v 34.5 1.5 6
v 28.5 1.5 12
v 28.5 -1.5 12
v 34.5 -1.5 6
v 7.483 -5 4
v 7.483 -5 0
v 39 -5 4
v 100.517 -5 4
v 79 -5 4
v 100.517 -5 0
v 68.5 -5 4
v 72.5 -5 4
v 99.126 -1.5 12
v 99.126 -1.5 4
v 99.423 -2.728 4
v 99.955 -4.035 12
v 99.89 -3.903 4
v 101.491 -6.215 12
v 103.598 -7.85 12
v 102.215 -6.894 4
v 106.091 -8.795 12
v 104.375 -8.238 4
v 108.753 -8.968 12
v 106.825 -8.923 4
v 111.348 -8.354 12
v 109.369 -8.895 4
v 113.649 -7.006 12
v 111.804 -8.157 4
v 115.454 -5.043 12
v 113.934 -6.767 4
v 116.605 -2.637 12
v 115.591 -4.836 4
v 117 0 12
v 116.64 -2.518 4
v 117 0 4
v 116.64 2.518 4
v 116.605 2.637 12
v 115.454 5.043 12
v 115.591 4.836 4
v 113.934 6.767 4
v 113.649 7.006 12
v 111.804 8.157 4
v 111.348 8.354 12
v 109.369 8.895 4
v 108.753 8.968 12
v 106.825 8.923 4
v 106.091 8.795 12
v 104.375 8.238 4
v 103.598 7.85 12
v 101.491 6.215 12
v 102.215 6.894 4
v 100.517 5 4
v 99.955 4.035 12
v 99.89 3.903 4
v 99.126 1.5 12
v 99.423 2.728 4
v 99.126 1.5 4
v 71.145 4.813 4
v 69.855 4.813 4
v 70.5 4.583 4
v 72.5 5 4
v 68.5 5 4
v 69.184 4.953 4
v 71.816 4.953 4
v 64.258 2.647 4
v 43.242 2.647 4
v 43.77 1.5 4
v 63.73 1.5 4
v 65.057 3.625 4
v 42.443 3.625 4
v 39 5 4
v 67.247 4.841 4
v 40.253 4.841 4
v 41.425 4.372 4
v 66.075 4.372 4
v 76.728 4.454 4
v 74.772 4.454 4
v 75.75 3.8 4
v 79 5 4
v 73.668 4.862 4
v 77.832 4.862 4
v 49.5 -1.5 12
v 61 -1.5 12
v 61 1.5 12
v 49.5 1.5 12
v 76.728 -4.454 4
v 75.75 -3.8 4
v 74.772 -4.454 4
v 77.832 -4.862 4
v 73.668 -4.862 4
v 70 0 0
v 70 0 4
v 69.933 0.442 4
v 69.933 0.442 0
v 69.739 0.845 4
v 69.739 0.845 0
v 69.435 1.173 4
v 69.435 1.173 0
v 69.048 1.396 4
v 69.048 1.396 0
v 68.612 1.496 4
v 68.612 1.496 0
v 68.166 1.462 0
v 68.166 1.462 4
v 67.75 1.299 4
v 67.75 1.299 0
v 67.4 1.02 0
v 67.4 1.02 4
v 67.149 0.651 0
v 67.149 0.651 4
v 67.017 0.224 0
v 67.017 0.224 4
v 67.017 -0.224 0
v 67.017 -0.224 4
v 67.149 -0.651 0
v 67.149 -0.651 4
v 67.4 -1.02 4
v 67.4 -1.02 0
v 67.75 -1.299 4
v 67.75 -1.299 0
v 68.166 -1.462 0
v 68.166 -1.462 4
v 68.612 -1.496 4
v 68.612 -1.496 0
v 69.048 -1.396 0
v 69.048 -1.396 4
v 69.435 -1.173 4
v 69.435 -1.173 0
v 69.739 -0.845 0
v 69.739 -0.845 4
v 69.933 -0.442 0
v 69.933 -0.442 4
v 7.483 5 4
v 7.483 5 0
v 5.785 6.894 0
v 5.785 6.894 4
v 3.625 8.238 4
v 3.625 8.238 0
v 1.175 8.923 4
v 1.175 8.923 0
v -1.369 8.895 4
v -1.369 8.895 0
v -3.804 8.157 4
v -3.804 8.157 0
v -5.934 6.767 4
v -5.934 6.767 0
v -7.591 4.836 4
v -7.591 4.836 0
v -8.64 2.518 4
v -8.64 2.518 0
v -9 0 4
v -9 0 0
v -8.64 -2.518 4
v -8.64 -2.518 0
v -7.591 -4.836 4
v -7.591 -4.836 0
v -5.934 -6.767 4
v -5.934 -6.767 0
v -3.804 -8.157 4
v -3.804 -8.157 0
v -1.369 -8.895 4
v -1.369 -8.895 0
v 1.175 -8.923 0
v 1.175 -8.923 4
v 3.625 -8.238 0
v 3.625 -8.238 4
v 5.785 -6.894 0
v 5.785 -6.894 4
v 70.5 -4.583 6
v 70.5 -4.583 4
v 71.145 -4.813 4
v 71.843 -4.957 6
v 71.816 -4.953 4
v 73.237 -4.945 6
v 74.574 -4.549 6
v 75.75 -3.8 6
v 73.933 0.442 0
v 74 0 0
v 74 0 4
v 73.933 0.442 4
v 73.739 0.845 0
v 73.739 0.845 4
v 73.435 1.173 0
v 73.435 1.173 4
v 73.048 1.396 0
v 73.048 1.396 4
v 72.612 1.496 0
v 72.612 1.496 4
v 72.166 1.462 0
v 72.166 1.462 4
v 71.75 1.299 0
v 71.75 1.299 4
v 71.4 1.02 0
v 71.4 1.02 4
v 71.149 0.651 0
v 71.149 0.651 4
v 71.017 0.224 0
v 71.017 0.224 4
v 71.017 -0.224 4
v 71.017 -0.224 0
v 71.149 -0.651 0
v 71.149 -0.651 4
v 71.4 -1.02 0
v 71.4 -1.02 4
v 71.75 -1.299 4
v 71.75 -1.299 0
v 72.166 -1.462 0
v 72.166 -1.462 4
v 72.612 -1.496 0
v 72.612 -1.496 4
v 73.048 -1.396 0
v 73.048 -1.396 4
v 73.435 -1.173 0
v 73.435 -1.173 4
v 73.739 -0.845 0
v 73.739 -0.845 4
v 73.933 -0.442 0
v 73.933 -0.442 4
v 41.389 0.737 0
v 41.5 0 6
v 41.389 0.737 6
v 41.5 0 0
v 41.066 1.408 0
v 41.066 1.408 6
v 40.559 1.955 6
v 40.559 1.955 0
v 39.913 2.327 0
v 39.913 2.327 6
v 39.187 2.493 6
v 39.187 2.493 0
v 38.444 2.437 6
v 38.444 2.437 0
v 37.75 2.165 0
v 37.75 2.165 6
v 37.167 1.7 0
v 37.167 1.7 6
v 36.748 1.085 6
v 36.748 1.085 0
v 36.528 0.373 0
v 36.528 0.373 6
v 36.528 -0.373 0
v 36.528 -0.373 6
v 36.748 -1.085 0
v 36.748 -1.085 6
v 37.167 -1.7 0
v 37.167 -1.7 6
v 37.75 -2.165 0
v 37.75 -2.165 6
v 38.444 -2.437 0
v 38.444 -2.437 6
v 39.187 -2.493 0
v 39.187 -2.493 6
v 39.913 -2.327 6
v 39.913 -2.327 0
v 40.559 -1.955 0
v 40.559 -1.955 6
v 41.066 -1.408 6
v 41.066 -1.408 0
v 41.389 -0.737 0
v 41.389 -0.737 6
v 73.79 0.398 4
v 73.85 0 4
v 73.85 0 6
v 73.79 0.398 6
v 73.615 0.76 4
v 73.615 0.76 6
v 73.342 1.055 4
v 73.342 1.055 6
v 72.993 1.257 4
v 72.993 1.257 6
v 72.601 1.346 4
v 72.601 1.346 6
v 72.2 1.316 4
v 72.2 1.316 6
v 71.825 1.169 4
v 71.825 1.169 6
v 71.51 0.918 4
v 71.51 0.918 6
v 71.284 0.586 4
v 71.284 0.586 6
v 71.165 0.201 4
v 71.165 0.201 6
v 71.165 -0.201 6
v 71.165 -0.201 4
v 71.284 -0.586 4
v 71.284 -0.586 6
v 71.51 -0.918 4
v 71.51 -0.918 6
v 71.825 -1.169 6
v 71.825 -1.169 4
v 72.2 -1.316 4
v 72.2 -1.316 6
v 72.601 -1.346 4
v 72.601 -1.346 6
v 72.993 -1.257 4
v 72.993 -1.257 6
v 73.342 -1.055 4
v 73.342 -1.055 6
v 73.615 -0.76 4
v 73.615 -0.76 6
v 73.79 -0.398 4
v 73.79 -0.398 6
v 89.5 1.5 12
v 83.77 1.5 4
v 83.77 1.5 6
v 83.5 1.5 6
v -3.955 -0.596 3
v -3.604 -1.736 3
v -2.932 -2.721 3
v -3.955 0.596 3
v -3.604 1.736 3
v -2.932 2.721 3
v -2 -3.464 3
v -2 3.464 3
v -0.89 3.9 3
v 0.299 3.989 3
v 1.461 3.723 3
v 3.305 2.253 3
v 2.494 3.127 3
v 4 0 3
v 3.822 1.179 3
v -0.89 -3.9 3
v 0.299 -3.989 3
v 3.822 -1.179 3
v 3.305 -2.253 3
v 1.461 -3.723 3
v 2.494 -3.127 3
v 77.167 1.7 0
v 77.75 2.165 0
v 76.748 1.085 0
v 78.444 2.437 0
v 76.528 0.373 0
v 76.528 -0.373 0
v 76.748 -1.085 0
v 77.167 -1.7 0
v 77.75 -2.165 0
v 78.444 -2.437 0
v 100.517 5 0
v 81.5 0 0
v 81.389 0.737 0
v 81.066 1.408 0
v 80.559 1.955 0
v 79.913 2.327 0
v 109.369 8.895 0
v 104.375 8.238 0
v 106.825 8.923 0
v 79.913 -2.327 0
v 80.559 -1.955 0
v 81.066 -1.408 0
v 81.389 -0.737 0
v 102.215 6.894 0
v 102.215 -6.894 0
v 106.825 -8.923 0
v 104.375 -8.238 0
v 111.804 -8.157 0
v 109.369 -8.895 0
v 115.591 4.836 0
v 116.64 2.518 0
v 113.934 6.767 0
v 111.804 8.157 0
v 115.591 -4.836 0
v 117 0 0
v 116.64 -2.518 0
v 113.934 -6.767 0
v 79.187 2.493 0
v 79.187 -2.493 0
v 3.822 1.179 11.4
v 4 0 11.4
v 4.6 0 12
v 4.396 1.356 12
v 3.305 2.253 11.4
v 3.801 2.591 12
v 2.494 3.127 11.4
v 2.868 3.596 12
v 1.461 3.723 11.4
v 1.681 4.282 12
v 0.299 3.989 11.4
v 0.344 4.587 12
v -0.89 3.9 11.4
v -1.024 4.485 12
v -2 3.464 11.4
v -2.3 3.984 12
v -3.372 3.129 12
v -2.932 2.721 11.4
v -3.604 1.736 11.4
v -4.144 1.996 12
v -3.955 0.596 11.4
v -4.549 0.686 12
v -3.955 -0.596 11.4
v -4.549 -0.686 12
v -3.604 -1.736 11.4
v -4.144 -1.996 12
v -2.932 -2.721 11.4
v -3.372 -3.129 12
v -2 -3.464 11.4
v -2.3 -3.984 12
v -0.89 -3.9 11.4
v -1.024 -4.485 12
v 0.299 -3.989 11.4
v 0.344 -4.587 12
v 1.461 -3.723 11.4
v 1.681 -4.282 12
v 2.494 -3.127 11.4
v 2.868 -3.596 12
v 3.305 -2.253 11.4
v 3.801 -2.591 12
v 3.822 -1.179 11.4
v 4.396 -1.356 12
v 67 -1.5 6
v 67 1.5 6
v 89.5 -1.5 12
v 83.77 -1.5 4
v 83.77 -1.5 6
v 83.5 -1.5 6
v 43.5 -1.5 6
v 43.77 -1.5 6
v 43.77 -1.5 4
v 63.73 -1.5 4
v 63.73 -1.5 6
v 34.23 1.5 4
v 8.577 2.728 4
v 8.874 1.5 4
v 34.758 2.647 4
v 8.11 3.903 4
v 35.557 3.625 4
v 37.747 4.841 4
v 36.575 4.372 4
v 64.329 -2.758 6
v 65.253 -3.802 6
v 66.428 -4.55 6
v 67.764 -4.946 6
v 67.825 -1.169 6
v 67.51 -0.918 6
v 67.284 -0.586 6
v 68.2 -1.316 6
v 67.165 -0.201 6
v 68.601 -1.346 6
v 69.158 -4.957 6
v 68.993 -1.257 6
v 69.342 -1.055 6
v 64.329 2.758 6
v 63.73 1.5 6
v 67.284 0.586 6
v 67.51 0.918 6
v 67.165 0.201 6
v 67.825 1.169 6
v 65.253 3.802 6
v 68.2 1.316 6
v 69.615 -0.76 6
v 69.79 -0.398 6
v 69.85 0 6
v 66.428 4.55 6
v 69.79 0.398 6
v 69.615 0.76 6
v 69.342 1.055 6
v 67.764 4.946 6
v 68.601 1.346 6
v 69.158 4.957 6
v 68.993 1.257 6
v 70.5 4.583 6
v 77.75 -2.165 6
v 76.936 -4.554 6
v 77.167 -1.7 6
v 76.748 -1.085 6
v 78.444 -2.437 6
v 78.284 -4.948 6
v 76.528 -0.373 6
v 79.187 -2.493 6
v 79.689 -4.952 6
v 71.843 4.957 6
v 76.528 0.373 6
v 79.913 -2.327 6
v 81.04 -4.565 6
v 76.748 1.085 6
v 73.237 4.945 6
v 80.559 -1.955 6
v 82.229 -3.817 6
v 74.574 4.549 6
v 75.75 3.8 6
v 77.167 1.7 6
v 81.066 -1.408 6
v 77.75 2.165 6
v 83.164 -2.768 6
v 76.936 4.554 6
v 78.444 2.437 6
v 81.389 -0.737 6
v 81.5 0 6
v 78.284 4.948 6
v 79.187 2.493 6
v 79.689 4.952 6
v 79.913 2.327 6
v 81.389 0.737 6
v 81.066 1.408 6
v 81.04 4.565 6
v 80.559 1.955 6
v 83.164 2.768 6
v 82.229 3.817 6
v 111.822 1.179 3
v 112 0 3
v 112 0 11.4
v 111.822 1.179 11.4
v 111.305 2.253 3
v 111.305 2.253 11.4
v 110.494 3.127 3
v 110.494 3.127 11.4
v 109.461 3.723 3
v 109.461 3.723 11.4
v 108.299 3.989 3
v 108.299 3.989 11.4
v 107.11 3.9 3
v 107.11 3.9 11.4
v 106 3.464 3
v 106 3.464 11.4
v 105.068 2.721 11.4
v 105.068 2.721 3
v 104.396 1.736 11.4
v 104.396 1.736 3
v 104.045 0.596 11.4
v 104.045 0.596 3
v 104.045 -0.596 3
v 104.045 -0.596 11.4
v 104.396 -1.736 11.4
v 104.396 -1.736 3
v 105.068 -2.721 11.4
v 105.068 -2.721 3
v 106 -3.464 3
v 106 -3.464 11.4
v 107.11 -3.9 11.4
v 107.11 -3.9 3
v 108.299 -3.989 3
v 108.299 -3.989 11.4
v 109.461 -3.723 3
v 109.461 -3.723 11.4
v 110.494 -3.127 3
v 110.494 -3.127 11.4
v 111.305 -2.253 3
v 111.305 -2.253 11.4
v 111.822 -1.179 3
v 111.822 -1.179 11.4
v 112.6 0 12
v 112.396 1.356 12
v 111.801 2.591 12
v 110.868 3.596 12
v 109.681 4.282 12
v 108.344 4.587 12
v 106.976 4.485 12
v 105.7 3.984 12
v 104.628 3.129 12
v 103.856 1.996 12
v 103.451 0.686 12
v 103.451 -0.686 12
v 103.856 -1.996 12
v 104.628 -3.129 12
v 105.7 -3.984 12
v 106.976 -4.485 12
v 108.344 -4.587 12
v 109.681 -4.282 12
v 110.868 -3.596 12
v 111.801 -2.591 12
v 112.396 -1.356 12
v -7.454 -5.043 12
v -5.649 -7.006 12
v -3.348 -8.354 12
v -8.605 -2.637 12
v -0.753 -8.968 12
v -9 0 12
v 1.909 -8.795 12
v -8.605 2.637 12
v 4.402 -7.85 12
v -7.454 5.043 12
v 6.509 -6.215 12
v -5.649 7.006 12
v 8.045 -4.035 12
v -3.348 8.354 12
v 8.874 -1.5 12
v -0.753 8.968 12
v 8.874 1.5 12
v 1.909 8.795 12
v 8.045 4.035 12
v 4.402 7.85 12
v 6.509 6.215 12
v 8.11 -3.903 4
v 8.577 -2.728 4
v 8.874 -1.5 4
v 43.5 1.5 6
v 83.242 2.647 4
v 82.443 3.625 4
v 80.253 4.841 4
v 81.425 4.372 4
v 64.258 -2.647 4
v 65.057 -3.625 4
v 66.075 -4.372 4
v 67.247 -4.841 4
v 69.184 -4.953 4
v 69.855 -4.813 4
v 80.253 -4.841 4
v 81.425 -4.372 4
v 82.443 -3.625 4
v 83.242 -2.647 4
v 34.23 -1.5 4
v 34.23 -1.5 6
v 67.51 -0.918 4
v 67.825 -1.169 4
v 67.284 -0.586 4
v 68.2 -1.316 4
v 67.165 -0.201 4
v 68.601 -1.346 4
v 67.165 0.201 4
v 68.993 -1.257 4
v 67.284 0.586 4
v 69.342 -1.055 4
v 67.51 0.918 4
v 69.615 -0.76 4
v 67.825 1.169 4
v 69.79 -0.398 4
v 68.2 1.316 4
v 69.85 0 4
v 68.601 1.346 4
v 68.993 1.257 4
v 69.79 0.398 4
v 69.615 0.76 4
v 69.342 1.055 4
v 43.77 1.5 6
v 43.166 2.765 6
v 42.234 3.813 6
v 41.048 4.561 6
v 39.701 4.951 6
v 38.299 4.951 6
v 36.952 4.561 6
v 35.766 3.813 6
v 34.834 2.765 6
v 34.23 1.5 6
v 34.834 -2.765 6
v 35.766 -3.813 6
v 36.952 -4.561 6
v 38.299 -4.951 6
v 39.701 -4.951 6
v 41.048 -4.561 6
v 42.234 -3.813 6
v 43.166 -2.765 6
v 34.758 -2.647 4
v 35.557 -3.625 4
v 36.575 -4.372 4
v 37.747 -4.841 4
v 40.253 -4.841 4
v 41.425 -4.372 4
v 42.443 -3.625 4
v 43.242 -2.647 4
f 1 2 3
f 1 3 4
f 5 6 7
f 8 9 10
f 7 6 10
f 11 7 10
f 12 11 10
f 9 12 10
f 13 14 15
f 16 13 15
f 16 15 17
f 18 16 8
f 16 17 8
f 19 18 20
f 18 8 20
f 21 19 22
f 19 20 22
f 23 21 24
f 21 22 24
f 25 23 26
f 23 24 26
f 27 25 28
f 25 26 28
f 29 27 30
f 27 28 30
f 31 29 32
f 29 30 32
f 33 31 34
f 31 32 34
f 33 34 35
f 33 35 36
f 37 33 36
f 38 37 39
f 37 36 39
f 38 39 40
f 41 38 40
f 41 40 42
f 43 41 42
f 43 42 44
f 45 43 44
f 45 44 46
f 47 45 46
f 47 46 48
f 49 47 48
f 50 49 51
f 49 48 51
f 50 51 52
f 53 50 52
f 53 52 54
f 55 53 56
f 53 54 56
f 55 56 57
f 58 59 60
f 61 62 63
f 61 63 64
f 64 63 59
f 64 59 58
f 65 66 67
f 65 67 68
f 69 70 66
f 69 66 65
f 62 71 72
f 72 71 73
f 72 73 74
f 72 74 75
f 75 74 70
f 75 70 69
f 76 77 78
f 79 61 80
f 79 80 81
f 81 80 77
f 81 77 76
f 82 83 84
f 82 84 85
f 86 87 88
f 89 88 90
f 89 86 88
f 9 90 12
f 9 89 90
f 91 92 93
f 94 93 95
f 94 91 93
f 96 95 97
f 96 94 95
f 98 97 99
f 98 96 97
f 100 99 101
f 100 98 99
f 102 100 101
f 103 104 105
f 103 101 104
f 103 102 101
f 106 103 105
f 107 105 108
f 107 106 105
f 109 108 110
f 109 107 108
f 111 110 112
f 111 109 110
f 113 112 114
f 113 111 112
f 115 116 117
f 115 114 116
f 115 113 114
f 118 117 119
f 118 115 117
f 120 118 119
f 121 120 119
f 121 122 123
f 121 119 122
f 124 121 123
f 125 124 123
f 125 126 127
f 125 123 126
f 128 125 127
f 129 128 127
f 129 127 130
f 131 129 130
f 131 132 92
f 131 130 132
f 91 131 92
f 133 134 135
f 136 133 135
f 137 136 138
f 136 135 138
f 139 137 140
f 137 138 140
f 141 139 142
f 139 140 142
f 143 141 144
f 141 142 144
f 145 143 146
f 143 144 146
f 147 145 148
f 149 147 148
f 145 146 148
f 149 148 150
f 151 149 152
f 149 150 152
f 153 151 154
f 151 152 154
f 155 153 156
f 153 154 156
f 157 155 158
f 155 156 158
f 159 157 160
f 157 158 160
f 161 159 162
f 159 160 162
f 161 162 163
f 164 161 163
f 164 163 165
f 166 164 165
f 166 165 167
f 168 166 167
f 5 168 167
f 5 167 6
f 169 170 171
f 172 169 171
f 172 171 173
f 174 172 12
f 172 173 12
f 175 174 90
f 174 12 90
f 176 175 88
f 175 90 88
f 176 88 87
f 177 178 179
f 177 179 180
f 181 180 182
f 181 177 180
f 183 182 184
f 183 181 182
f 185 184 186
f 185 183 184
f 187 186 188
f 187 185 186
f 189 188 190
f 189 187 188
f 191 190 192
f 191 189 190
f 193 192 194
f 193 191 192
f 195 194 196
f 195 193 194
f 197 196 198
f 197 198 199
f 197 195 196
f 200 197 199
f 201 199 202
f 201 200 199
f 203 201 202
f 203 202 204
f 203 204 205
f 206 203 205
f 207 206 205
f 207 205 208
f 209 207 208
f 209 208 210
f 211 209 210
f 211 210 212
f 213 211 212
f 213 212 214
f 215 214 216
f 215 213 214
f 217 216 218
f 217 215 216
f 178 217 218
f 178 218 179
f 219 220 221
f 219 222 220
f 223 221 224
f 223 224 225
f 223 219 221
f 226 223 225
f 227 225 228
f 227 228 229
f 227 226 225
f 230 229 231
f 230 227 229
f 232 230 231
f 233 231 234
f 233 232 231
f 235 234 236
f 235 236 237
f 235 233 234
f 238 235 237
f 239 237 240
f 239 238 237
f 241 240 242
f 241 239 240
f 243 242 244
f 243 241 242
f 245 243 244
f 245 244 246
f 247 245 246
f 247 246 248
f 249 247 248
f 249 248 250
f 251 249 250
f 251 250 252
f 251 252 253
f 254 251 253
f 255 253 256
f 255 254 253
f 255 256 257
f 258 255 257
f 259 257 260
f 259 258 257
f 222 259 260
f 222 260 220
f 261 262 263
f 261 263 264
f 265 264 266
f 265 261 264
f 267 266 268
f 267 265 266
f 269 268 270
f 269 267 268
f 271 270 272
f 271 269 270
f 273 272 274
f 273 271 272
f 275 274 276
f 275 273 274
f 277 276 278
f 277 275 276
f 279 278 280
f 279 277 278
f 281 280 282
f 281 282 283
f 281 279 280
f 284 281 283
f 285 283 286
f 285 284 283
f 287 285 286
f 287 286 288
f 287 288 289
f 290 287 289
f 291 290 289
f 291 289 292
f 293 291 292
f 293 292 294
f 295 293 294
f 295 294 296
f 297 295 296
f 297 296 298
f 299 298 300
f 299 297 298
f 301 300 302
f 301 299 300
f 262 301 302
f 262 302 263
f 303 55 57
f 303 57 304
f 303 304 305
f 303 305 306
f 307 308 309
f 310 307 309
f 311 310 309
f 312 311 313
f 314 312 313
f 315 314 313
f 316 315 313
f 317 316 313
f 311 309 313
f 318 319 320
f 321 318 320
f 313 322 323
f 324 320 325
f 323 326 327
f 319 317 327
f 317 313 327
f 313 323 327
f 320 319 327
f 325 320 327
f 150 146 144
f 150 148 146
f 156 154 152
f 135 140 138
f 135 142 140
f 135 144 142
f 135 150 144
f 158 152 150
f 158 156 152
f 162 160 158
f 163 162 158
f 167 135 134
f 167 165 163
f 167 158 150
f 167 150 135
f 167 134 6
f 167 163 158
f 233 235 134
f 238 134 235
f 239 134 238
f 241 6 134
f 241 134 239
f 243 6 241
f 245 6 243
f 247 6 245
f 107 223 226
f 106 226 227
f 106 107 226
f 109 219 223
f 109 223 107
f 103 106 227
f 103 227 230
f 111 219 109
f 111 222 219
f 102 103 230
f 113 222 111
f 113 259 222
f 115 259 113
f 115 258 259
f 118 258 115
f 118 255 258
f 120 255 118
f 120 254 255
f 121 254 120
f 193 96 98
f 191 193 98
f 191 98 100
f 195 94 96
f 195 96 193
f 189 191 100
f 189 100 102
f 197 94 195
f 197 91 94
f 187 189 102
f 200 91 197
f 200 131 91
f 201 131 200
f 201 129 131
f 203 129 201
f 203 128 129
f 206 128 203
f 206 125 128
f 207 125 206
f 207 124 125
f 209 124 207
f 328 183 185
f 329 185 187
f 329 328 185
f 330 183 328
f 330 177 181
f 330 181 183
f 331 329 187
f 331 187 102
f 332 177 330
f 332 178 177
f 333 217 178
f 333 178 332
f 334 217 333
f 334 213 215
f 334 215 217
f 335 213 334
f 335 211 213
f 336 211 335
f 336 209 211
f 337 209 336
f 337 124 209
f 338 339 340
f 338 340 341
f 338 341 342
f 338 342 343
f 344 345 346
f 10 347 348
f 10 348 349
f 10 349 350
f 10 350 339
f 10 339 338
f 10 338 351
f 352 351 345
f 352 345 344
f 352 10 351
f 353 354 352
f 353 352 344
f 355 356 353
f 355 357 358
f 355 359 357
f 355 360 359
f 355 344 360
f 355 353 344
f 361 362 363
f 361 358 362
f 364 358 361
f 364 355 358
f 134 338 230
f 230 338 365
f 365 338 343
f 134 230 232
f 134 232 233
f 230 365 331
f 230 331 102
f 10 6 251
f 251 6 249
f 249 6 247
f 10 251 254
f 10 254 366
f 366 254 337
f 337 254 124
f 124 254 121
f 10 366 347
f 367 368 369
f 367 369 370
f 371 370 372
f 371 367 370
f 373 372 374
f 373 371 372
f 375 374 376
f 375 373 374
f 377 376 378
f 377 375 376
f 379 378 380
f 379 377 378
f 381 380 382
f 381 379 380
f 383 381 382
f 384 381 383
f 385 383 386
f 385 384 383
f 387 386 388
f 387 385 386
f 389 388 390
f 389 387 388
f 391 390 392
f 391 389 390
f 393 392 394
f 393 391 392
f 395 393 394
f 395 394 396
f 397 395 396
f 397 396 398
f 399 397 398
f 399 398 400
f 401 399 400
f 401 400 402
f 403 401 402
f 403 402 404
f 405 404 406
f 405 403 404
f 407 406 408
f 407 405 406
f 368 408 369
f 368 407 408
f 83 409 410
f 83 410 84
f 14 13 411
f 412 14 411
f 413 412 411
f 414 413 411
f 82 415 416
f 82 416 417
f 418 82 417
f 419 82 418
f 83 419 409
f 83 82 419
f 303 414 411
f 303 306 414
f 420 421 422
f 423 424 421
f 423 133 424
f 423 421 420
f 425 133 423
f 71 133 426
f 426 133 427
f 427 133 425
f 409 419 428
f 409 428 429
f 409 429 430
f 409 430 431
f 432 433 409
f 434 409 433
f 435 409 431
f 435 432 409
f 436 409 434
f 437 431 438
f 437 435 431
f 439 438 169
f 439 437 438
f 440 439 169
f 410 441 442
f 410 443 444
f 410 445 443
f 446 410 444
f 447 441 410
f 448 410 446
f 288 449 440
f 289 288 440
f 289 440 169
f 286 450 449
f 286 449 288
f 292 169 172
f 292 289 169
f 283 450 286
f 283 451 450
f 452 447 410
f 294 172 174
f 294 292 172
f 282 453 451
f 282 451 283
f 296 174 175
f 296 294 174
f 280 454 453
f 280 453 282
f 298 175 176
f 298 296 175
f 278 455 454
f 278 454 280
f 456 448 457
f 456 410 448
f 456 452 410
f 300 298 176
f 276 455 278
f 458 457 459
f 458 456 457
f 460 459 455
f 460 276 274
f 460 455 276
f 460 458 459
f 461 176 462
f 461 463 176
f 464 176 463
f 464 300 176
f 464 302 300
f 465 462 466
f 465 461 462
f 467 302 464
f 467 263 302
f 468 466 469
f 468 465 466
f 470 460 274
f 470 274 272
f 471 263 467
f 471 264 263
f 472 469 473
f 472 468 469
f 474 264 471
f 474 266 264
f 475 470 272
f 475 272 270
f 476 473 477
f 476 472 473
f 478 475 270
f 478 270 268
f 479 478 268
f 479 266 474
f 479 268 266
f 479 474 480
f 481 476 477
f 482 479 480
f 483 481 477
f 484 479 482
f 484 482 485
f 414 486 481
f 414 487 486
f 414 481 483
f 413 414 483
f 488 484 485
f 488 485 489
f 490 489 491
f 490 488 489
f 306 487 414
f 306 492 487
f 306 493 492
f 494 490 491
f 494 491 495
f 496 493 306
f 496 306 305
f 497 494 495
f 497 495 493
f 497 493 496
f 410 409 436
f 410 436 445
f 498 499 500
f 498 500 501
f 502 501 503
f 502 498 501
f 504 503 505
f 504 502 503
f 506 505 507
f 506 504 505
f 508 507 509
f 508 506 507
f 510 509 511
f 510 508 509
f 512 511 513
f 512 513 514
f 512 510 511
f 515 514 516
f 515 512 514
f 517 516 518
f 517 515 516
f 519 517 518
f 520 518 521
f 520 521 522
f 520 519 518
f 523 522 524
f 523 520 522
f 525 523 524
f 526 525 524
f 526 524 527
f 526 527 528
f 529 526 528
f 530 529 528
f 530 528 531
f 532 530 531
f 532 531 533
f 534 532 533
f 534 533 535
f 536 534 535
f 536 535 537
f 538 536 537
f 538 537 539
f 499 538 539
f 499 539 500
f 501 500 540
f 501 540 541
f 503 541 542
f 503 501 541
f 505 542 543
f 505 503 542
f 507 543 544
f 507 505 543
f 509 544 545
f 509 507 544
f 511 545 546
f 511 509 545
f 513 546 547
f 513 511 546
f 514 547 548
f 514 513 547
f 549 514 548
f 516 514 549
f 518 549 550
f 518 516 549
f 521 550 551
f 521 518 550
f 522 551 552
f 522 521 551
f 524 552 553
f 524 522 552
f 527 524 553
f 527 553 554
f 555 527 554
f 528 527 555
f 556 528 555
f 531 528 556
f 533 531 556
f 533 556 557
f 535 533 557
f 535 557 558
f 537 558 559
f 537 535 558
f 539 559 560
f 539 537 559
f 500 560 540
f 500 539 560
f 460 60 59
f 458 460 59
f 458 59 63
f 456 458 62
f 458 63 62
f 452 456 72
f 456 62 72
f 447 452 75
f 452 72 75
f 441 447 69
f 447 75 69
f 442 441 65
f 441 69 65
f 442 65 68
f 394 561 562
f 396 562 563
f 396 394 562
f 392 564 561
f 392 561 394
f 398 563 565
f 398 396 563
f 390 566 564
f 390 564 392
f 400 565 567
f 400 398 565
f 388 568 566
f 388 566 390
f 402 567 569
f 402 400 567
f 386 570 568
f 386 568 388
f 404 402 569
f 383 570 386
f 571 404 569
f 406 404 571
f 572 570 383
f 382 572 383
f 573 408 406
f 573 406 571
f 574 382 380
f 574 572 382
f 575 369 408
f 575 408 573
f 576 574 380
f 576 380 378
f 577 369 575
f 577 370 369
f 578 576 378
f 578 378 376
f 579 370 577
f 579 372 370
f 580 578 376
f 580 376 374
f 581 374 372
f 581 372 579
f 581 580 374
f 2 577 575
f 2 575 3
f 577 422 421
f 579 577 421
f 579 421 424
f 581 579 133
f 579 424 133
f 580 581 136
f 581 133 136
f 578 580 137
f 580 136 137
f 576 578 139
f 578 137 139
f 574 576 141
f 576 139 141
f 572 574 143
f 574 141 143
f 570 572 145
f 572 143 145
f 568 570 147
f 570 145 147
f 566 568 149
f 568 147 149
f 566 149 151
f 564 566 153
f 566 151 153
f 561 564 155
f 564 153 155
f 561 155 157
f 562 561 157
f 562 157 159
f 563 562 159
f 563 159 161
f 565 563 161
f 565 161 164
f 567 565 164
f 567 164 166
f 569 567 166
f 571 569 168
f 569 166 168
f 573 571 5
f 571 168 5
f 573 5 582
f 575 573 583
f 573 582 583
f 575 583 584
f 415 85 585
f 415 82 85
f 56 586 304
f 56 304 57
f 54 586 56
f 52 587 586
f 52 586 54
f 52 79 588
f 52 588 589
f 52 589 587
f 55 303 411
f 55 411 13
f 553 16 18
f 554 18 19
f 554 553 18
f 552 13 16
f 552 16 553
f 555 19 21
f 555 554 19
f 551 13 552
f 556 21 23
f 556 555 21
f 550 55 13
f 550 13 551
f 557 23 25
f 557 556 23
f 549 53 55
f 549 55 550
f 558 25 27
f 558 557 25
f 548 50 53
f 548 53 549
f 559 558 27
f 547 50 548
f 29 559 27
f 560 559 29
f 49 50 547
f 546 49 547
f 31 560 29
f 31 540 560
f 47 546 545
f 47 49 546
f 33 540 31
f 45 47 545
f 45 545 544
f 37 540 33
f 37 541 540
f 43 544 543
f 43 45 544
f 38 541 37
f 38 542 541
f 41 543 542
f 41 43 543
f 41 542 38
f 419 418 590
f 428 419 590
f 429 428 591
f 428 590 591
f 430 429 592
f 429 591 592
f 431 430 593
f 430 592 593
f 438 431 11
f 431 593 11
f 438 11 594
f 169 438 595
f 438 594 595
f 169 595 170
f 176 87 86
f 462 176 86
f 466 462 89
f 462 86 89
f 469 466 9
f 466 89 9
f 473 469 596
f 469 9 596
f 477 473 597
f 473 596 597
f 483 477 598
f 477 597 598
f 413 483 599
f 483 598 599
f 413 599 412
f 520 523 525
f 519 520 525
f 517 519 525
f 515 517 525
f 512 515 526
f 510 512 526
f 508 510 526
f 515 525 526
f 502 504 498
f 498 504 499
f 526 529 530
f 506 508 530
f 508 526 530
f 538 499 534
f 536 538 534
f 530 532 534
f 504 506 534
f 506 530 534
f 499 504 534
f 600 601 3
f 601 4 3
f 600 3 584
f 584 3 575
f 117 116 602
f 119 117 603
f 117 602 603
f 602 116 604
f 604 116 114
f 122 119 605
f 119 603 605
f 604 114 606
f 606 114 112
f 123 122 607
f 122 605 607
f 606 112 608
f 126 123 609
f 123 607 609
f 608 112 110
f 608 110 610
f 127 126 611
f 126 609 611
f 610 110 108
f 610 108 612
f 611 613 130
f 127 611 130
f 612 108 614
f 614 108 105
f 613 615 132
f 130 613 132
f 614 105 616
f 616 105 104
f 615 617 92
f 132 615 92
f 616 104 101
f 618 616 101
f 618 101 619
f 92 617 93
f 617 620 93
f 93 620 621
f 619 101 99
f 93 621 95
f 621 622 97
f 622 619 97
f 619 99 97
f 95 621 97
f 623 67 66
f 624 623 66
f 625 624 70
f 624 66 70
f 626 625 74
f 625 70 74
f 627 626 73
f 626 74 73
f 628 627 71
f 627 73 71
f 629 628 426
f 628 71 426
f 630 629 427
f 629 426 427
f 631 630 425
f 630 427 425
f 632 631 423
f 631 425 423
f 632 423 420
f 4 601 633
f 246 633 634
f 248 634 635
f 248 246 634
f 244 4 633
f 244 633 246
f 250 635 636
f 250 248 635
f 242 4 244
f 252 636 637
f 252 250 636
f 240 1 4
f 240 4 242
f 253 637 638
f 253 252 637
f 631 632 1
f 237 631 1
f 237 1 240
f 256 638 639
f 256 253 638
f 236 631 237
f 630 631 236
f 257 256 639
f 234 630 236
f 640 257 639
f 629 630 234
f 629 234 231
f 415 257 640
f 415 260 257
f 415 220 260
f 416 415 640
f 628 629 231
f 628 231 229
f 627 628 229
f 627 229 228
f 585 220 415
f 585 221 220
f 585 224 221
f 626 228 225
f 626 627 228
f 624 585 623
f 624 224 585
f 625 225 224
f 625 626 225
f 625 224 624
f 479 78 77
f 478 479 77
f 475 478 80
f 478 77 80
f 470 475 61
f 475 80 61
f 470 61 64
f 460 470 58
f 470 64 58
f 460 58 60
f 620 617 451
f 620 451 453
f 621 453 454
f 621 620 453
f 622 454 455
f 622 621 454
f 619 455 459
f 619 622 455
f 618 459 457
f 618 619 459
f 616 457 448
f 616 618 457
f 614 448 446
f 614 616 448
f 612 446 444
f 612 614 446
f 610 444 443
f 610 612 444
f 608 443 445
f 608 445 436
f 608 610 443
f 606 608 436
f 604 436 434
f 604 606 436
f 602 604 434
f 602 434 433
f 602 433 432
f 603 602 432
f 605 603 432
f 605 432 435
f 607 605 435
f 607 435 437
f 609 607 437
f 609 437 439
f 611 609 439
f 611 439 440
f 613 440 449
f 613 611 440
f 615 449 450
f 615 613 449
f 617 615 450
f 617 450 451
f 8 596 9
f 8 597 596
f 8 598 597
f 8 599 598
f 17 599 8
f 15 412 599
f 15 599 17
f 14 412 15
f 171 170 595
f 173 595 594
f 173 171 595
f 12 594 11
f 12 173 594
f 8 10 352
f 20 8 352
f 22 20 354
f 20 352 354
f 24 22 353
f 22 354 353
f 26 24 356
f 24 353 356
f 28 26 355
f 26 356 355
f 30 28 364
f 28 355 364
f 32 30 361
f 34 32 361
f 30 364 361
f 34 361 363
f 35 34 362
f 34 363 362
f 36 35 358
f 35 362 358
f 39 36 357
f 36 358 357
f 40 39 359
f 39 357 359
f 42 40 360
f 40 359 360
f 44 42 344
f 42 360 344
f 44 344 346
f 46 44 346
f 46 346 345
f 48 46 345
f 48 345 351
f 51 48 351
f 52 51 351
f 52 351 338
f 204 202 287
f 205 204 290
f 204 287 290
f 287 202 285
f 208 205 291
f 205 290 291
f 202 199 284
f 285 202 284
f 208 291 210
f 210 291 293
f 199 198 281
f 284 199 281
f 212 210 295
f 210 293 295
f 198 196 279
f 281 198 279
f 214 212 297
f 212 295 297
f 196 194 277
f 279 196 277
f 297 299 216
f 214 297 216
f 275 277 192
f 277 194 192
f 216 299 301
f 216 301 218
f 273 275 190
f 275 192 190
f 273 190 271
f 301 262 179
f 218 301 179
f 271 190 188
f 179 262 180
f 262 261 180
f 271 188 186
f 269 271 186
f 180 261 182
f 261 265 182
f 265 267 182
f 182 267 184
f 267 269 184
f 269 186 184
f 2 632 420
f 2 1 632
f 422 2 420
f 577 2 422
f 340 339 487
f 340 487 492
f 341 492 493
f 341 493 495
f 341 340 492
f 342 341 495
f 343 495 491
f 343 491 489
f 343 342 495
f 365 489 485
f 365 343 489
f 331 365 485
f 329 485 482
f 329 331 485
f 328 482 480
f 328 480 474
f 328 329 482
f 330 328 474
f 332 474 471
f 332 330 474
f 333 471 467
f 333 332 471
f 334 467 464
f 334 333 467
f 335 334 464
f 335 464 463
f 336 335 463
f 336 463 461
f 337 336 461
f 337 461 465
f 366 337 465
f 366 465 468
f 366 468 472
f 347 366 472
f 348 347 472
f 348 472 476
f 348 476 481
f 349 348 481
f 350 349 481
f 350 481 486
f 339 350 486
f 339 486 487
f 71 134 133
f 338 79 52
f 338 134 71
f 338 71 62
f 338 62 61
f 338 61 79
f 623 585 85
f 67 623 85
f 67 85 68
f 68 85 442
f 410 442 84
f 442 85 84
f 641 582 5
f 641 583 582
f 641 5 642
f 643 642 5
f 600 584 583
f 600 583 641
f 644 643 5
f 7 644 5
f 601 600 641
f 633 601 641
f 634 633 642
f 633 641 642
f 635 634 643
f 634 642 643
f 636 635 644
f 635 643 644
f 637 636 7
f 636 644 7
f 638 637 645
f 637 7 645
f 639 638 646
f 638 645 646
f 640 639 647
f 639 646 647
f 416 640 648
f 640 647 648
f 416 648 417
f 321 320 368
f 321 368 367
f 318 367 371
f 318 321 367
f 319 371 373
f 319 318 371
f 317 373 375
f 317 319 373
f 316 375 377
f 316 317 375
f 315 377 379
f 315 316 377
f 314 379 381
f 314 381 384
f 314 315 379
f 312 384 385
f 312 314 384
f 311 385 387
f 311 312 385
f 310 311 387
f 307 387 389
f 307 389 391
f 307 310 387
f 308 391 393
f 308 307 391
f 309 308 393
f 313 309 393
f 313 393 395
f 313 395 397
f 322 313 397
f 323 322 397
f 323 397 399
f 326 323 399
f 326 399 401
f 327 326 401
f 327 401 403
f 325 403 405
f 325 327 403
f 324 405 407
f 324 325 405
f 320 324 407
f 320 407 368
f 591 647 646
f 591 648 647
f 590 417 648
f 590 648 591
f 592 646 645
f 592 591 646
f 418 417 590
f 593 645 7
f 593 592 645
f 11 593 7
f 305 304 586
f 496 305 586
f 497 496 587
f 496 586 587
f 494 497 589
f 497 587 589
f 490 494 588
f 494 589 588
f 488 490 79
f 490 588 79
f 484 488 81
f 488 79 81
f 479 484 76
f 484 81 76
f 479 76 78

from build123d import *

# Parameters (mm, degrees)
SKETCH_R      = 4
SKETCH_R_2    = 2.5
SKETCH_R_3    = 1.5
PAD_DEPTH     = 4
SKETCH001_R   = 9
SKETCH001_R_2 = 4
PAD001_DEPTH  = 8
SKETCH002_R   = 4
PAD002_DEPTH  = 3
PAD003_DEPTH  = 1.5
SKETCH004_R   = 5
SKETCH004_R_2 = 2.5
PAD004_DEPTH  = 2
CHAMFER_SIZE  = 0.6
SKETCH005_R   = 1.35
PAD005_DEPTH  = 2


with BuildPart() as part:
    # Sketch → Pad (new body)
    with BuildSketch(Plane.XY):
        with BuildLine():
            ThreePointArc((7.483315, 5), (-9, 0), (7.483315, -5))
            Line((7.483315, -5), (100.516685, -5))
            ThreePointArc((100.516685, -5), (117, 0), (100.516685, 5))
            Line((7.483315, 5), (100.516685, 5))
        make_face()
        Circle(SKETCH_R, mode=Mode.SUBTRACT)
        with Locations((108, 0)):
            Circle(SKETCH_R, mode=Mode.SUBTRACT)
        with Locations((39, 0)):
            Circle(SKETCH_R_2, mode=Mode.SUBTRACT)
        with Locations((79, 0)):
            Circle(SKETCH_R_2, mode=Mode.SUBTRACT)
        with Locations((72.5, 0)):
            Circle(SKETCH_R_3, mode=Mode.SUBTRACT)
        with Locations((68.5, 0)):
            Circle(SKETCH_R_3, mode=Mode.SUBTRACT)
    extrude(amount=PAD_DEPTH)

    # Sketch001 (on Face12 of Pad) → Pad001 (join)
    with BuildSketch(Plane.XY.offset(4)):
        Circle(SKETCH001_R)
        Circle(SKETCH001_R_2, mode=Mode.SUBTRACT)
        with Locations((108, 0)):
            Circle(SKETCH001_R)
        with Locations((108, 0)):
            Circle(SKETCH001_R_2, mode=Mode.SUBTRACT)
    extrude(amount=PAD001_DEPTH)

    # Sketch002 (on Face4 of Pad001) → Pad002 (join)
    with BuildSketch(Plane(origin=(0, 0, 0), x_dir=(1, 0, 0), z_dir=(0, 0, -1))):
        with Locations((108, 0)):
            Circle(SKETCH002_R)
        Circle(SKETCH002_R)
    extrude(amount=-PAD002_DEPTH)

    # Sketch003 (on Face3 of Pad002) → Pad003 (join, symmetric)
    with BuildSketch(Plane.XZ):
        Polygon((100, 12), (100, 4), (83.5, 4), (83.5, 6), (89.5, 12), align=None)
        Polygon((8, 4), (8, 12), (28.5, 12), (34.5, 6), (34.5, 4), align=None)
        Polygon((43.5, 4), (67, 4), (67, 6), (61, 12), (49.5, 12), (43.5, 6), align=None)
    extrude(amount=PAD003_DEPTH, both=True)

    # Sketch004 (on Face7 of Pad003) → Pad004 (join)
    with BuildSketch(Plane.XY.offset(4)):
        with Locations((39, 0)):
            Circle(SKETCH004_R)
        with Locations((39, 0)):
            Circle(SKETCH004_R_2, mode=Mode.SUBTRACT)
        with Locations((79, 0)):
            Circle(SKETCH004_R)
        with Locations((79, 0)):
            Circle(SKETCH004_R_2, mode=Mode.SUBTRACT)
    extrude(amount=PAD004_DEPTH)

    # Chamfer
    chamfer_edges = [part.edges().sort_by_distance(p)[0] for p in [
        (-4, 0, 12),
        (104, 0, 12),
    ]]
    chamfer(chamfer_edges, length=CHAMFER_SIZE)

    # Sketch005 (on Face22 of Chamfer) → Pad005 (join)
    with BuildSketch(Plane.XY.offset(4)):
        with BuildLine():
            ThreePointArc((70.5, 4.582576), (63.5, 0), (70.5, -4.582576))
            ThreePointArc((70.5, -4.582576), (73.237469, -4.945315), (75.75, -3.799671))
            ThreePointArc((75.75, 3.799671), (74, 0), (75.75, -3.799671))
            ThreePointArc((75.75, 3.799671), (73.237469, 4.945315), (70.5, 4.582576))
        make_face()
        with Locations((68.5, 0)):
            Circle(SKETCH005_R, mode=Mode.SUBTRACT)
        with Locations((72.5, 0)):
            Circle(SKETCH005_R, mode=Mode.SUBTRACT)
    extrude(amount=PAD005_DEPTH)


solid = part.part
